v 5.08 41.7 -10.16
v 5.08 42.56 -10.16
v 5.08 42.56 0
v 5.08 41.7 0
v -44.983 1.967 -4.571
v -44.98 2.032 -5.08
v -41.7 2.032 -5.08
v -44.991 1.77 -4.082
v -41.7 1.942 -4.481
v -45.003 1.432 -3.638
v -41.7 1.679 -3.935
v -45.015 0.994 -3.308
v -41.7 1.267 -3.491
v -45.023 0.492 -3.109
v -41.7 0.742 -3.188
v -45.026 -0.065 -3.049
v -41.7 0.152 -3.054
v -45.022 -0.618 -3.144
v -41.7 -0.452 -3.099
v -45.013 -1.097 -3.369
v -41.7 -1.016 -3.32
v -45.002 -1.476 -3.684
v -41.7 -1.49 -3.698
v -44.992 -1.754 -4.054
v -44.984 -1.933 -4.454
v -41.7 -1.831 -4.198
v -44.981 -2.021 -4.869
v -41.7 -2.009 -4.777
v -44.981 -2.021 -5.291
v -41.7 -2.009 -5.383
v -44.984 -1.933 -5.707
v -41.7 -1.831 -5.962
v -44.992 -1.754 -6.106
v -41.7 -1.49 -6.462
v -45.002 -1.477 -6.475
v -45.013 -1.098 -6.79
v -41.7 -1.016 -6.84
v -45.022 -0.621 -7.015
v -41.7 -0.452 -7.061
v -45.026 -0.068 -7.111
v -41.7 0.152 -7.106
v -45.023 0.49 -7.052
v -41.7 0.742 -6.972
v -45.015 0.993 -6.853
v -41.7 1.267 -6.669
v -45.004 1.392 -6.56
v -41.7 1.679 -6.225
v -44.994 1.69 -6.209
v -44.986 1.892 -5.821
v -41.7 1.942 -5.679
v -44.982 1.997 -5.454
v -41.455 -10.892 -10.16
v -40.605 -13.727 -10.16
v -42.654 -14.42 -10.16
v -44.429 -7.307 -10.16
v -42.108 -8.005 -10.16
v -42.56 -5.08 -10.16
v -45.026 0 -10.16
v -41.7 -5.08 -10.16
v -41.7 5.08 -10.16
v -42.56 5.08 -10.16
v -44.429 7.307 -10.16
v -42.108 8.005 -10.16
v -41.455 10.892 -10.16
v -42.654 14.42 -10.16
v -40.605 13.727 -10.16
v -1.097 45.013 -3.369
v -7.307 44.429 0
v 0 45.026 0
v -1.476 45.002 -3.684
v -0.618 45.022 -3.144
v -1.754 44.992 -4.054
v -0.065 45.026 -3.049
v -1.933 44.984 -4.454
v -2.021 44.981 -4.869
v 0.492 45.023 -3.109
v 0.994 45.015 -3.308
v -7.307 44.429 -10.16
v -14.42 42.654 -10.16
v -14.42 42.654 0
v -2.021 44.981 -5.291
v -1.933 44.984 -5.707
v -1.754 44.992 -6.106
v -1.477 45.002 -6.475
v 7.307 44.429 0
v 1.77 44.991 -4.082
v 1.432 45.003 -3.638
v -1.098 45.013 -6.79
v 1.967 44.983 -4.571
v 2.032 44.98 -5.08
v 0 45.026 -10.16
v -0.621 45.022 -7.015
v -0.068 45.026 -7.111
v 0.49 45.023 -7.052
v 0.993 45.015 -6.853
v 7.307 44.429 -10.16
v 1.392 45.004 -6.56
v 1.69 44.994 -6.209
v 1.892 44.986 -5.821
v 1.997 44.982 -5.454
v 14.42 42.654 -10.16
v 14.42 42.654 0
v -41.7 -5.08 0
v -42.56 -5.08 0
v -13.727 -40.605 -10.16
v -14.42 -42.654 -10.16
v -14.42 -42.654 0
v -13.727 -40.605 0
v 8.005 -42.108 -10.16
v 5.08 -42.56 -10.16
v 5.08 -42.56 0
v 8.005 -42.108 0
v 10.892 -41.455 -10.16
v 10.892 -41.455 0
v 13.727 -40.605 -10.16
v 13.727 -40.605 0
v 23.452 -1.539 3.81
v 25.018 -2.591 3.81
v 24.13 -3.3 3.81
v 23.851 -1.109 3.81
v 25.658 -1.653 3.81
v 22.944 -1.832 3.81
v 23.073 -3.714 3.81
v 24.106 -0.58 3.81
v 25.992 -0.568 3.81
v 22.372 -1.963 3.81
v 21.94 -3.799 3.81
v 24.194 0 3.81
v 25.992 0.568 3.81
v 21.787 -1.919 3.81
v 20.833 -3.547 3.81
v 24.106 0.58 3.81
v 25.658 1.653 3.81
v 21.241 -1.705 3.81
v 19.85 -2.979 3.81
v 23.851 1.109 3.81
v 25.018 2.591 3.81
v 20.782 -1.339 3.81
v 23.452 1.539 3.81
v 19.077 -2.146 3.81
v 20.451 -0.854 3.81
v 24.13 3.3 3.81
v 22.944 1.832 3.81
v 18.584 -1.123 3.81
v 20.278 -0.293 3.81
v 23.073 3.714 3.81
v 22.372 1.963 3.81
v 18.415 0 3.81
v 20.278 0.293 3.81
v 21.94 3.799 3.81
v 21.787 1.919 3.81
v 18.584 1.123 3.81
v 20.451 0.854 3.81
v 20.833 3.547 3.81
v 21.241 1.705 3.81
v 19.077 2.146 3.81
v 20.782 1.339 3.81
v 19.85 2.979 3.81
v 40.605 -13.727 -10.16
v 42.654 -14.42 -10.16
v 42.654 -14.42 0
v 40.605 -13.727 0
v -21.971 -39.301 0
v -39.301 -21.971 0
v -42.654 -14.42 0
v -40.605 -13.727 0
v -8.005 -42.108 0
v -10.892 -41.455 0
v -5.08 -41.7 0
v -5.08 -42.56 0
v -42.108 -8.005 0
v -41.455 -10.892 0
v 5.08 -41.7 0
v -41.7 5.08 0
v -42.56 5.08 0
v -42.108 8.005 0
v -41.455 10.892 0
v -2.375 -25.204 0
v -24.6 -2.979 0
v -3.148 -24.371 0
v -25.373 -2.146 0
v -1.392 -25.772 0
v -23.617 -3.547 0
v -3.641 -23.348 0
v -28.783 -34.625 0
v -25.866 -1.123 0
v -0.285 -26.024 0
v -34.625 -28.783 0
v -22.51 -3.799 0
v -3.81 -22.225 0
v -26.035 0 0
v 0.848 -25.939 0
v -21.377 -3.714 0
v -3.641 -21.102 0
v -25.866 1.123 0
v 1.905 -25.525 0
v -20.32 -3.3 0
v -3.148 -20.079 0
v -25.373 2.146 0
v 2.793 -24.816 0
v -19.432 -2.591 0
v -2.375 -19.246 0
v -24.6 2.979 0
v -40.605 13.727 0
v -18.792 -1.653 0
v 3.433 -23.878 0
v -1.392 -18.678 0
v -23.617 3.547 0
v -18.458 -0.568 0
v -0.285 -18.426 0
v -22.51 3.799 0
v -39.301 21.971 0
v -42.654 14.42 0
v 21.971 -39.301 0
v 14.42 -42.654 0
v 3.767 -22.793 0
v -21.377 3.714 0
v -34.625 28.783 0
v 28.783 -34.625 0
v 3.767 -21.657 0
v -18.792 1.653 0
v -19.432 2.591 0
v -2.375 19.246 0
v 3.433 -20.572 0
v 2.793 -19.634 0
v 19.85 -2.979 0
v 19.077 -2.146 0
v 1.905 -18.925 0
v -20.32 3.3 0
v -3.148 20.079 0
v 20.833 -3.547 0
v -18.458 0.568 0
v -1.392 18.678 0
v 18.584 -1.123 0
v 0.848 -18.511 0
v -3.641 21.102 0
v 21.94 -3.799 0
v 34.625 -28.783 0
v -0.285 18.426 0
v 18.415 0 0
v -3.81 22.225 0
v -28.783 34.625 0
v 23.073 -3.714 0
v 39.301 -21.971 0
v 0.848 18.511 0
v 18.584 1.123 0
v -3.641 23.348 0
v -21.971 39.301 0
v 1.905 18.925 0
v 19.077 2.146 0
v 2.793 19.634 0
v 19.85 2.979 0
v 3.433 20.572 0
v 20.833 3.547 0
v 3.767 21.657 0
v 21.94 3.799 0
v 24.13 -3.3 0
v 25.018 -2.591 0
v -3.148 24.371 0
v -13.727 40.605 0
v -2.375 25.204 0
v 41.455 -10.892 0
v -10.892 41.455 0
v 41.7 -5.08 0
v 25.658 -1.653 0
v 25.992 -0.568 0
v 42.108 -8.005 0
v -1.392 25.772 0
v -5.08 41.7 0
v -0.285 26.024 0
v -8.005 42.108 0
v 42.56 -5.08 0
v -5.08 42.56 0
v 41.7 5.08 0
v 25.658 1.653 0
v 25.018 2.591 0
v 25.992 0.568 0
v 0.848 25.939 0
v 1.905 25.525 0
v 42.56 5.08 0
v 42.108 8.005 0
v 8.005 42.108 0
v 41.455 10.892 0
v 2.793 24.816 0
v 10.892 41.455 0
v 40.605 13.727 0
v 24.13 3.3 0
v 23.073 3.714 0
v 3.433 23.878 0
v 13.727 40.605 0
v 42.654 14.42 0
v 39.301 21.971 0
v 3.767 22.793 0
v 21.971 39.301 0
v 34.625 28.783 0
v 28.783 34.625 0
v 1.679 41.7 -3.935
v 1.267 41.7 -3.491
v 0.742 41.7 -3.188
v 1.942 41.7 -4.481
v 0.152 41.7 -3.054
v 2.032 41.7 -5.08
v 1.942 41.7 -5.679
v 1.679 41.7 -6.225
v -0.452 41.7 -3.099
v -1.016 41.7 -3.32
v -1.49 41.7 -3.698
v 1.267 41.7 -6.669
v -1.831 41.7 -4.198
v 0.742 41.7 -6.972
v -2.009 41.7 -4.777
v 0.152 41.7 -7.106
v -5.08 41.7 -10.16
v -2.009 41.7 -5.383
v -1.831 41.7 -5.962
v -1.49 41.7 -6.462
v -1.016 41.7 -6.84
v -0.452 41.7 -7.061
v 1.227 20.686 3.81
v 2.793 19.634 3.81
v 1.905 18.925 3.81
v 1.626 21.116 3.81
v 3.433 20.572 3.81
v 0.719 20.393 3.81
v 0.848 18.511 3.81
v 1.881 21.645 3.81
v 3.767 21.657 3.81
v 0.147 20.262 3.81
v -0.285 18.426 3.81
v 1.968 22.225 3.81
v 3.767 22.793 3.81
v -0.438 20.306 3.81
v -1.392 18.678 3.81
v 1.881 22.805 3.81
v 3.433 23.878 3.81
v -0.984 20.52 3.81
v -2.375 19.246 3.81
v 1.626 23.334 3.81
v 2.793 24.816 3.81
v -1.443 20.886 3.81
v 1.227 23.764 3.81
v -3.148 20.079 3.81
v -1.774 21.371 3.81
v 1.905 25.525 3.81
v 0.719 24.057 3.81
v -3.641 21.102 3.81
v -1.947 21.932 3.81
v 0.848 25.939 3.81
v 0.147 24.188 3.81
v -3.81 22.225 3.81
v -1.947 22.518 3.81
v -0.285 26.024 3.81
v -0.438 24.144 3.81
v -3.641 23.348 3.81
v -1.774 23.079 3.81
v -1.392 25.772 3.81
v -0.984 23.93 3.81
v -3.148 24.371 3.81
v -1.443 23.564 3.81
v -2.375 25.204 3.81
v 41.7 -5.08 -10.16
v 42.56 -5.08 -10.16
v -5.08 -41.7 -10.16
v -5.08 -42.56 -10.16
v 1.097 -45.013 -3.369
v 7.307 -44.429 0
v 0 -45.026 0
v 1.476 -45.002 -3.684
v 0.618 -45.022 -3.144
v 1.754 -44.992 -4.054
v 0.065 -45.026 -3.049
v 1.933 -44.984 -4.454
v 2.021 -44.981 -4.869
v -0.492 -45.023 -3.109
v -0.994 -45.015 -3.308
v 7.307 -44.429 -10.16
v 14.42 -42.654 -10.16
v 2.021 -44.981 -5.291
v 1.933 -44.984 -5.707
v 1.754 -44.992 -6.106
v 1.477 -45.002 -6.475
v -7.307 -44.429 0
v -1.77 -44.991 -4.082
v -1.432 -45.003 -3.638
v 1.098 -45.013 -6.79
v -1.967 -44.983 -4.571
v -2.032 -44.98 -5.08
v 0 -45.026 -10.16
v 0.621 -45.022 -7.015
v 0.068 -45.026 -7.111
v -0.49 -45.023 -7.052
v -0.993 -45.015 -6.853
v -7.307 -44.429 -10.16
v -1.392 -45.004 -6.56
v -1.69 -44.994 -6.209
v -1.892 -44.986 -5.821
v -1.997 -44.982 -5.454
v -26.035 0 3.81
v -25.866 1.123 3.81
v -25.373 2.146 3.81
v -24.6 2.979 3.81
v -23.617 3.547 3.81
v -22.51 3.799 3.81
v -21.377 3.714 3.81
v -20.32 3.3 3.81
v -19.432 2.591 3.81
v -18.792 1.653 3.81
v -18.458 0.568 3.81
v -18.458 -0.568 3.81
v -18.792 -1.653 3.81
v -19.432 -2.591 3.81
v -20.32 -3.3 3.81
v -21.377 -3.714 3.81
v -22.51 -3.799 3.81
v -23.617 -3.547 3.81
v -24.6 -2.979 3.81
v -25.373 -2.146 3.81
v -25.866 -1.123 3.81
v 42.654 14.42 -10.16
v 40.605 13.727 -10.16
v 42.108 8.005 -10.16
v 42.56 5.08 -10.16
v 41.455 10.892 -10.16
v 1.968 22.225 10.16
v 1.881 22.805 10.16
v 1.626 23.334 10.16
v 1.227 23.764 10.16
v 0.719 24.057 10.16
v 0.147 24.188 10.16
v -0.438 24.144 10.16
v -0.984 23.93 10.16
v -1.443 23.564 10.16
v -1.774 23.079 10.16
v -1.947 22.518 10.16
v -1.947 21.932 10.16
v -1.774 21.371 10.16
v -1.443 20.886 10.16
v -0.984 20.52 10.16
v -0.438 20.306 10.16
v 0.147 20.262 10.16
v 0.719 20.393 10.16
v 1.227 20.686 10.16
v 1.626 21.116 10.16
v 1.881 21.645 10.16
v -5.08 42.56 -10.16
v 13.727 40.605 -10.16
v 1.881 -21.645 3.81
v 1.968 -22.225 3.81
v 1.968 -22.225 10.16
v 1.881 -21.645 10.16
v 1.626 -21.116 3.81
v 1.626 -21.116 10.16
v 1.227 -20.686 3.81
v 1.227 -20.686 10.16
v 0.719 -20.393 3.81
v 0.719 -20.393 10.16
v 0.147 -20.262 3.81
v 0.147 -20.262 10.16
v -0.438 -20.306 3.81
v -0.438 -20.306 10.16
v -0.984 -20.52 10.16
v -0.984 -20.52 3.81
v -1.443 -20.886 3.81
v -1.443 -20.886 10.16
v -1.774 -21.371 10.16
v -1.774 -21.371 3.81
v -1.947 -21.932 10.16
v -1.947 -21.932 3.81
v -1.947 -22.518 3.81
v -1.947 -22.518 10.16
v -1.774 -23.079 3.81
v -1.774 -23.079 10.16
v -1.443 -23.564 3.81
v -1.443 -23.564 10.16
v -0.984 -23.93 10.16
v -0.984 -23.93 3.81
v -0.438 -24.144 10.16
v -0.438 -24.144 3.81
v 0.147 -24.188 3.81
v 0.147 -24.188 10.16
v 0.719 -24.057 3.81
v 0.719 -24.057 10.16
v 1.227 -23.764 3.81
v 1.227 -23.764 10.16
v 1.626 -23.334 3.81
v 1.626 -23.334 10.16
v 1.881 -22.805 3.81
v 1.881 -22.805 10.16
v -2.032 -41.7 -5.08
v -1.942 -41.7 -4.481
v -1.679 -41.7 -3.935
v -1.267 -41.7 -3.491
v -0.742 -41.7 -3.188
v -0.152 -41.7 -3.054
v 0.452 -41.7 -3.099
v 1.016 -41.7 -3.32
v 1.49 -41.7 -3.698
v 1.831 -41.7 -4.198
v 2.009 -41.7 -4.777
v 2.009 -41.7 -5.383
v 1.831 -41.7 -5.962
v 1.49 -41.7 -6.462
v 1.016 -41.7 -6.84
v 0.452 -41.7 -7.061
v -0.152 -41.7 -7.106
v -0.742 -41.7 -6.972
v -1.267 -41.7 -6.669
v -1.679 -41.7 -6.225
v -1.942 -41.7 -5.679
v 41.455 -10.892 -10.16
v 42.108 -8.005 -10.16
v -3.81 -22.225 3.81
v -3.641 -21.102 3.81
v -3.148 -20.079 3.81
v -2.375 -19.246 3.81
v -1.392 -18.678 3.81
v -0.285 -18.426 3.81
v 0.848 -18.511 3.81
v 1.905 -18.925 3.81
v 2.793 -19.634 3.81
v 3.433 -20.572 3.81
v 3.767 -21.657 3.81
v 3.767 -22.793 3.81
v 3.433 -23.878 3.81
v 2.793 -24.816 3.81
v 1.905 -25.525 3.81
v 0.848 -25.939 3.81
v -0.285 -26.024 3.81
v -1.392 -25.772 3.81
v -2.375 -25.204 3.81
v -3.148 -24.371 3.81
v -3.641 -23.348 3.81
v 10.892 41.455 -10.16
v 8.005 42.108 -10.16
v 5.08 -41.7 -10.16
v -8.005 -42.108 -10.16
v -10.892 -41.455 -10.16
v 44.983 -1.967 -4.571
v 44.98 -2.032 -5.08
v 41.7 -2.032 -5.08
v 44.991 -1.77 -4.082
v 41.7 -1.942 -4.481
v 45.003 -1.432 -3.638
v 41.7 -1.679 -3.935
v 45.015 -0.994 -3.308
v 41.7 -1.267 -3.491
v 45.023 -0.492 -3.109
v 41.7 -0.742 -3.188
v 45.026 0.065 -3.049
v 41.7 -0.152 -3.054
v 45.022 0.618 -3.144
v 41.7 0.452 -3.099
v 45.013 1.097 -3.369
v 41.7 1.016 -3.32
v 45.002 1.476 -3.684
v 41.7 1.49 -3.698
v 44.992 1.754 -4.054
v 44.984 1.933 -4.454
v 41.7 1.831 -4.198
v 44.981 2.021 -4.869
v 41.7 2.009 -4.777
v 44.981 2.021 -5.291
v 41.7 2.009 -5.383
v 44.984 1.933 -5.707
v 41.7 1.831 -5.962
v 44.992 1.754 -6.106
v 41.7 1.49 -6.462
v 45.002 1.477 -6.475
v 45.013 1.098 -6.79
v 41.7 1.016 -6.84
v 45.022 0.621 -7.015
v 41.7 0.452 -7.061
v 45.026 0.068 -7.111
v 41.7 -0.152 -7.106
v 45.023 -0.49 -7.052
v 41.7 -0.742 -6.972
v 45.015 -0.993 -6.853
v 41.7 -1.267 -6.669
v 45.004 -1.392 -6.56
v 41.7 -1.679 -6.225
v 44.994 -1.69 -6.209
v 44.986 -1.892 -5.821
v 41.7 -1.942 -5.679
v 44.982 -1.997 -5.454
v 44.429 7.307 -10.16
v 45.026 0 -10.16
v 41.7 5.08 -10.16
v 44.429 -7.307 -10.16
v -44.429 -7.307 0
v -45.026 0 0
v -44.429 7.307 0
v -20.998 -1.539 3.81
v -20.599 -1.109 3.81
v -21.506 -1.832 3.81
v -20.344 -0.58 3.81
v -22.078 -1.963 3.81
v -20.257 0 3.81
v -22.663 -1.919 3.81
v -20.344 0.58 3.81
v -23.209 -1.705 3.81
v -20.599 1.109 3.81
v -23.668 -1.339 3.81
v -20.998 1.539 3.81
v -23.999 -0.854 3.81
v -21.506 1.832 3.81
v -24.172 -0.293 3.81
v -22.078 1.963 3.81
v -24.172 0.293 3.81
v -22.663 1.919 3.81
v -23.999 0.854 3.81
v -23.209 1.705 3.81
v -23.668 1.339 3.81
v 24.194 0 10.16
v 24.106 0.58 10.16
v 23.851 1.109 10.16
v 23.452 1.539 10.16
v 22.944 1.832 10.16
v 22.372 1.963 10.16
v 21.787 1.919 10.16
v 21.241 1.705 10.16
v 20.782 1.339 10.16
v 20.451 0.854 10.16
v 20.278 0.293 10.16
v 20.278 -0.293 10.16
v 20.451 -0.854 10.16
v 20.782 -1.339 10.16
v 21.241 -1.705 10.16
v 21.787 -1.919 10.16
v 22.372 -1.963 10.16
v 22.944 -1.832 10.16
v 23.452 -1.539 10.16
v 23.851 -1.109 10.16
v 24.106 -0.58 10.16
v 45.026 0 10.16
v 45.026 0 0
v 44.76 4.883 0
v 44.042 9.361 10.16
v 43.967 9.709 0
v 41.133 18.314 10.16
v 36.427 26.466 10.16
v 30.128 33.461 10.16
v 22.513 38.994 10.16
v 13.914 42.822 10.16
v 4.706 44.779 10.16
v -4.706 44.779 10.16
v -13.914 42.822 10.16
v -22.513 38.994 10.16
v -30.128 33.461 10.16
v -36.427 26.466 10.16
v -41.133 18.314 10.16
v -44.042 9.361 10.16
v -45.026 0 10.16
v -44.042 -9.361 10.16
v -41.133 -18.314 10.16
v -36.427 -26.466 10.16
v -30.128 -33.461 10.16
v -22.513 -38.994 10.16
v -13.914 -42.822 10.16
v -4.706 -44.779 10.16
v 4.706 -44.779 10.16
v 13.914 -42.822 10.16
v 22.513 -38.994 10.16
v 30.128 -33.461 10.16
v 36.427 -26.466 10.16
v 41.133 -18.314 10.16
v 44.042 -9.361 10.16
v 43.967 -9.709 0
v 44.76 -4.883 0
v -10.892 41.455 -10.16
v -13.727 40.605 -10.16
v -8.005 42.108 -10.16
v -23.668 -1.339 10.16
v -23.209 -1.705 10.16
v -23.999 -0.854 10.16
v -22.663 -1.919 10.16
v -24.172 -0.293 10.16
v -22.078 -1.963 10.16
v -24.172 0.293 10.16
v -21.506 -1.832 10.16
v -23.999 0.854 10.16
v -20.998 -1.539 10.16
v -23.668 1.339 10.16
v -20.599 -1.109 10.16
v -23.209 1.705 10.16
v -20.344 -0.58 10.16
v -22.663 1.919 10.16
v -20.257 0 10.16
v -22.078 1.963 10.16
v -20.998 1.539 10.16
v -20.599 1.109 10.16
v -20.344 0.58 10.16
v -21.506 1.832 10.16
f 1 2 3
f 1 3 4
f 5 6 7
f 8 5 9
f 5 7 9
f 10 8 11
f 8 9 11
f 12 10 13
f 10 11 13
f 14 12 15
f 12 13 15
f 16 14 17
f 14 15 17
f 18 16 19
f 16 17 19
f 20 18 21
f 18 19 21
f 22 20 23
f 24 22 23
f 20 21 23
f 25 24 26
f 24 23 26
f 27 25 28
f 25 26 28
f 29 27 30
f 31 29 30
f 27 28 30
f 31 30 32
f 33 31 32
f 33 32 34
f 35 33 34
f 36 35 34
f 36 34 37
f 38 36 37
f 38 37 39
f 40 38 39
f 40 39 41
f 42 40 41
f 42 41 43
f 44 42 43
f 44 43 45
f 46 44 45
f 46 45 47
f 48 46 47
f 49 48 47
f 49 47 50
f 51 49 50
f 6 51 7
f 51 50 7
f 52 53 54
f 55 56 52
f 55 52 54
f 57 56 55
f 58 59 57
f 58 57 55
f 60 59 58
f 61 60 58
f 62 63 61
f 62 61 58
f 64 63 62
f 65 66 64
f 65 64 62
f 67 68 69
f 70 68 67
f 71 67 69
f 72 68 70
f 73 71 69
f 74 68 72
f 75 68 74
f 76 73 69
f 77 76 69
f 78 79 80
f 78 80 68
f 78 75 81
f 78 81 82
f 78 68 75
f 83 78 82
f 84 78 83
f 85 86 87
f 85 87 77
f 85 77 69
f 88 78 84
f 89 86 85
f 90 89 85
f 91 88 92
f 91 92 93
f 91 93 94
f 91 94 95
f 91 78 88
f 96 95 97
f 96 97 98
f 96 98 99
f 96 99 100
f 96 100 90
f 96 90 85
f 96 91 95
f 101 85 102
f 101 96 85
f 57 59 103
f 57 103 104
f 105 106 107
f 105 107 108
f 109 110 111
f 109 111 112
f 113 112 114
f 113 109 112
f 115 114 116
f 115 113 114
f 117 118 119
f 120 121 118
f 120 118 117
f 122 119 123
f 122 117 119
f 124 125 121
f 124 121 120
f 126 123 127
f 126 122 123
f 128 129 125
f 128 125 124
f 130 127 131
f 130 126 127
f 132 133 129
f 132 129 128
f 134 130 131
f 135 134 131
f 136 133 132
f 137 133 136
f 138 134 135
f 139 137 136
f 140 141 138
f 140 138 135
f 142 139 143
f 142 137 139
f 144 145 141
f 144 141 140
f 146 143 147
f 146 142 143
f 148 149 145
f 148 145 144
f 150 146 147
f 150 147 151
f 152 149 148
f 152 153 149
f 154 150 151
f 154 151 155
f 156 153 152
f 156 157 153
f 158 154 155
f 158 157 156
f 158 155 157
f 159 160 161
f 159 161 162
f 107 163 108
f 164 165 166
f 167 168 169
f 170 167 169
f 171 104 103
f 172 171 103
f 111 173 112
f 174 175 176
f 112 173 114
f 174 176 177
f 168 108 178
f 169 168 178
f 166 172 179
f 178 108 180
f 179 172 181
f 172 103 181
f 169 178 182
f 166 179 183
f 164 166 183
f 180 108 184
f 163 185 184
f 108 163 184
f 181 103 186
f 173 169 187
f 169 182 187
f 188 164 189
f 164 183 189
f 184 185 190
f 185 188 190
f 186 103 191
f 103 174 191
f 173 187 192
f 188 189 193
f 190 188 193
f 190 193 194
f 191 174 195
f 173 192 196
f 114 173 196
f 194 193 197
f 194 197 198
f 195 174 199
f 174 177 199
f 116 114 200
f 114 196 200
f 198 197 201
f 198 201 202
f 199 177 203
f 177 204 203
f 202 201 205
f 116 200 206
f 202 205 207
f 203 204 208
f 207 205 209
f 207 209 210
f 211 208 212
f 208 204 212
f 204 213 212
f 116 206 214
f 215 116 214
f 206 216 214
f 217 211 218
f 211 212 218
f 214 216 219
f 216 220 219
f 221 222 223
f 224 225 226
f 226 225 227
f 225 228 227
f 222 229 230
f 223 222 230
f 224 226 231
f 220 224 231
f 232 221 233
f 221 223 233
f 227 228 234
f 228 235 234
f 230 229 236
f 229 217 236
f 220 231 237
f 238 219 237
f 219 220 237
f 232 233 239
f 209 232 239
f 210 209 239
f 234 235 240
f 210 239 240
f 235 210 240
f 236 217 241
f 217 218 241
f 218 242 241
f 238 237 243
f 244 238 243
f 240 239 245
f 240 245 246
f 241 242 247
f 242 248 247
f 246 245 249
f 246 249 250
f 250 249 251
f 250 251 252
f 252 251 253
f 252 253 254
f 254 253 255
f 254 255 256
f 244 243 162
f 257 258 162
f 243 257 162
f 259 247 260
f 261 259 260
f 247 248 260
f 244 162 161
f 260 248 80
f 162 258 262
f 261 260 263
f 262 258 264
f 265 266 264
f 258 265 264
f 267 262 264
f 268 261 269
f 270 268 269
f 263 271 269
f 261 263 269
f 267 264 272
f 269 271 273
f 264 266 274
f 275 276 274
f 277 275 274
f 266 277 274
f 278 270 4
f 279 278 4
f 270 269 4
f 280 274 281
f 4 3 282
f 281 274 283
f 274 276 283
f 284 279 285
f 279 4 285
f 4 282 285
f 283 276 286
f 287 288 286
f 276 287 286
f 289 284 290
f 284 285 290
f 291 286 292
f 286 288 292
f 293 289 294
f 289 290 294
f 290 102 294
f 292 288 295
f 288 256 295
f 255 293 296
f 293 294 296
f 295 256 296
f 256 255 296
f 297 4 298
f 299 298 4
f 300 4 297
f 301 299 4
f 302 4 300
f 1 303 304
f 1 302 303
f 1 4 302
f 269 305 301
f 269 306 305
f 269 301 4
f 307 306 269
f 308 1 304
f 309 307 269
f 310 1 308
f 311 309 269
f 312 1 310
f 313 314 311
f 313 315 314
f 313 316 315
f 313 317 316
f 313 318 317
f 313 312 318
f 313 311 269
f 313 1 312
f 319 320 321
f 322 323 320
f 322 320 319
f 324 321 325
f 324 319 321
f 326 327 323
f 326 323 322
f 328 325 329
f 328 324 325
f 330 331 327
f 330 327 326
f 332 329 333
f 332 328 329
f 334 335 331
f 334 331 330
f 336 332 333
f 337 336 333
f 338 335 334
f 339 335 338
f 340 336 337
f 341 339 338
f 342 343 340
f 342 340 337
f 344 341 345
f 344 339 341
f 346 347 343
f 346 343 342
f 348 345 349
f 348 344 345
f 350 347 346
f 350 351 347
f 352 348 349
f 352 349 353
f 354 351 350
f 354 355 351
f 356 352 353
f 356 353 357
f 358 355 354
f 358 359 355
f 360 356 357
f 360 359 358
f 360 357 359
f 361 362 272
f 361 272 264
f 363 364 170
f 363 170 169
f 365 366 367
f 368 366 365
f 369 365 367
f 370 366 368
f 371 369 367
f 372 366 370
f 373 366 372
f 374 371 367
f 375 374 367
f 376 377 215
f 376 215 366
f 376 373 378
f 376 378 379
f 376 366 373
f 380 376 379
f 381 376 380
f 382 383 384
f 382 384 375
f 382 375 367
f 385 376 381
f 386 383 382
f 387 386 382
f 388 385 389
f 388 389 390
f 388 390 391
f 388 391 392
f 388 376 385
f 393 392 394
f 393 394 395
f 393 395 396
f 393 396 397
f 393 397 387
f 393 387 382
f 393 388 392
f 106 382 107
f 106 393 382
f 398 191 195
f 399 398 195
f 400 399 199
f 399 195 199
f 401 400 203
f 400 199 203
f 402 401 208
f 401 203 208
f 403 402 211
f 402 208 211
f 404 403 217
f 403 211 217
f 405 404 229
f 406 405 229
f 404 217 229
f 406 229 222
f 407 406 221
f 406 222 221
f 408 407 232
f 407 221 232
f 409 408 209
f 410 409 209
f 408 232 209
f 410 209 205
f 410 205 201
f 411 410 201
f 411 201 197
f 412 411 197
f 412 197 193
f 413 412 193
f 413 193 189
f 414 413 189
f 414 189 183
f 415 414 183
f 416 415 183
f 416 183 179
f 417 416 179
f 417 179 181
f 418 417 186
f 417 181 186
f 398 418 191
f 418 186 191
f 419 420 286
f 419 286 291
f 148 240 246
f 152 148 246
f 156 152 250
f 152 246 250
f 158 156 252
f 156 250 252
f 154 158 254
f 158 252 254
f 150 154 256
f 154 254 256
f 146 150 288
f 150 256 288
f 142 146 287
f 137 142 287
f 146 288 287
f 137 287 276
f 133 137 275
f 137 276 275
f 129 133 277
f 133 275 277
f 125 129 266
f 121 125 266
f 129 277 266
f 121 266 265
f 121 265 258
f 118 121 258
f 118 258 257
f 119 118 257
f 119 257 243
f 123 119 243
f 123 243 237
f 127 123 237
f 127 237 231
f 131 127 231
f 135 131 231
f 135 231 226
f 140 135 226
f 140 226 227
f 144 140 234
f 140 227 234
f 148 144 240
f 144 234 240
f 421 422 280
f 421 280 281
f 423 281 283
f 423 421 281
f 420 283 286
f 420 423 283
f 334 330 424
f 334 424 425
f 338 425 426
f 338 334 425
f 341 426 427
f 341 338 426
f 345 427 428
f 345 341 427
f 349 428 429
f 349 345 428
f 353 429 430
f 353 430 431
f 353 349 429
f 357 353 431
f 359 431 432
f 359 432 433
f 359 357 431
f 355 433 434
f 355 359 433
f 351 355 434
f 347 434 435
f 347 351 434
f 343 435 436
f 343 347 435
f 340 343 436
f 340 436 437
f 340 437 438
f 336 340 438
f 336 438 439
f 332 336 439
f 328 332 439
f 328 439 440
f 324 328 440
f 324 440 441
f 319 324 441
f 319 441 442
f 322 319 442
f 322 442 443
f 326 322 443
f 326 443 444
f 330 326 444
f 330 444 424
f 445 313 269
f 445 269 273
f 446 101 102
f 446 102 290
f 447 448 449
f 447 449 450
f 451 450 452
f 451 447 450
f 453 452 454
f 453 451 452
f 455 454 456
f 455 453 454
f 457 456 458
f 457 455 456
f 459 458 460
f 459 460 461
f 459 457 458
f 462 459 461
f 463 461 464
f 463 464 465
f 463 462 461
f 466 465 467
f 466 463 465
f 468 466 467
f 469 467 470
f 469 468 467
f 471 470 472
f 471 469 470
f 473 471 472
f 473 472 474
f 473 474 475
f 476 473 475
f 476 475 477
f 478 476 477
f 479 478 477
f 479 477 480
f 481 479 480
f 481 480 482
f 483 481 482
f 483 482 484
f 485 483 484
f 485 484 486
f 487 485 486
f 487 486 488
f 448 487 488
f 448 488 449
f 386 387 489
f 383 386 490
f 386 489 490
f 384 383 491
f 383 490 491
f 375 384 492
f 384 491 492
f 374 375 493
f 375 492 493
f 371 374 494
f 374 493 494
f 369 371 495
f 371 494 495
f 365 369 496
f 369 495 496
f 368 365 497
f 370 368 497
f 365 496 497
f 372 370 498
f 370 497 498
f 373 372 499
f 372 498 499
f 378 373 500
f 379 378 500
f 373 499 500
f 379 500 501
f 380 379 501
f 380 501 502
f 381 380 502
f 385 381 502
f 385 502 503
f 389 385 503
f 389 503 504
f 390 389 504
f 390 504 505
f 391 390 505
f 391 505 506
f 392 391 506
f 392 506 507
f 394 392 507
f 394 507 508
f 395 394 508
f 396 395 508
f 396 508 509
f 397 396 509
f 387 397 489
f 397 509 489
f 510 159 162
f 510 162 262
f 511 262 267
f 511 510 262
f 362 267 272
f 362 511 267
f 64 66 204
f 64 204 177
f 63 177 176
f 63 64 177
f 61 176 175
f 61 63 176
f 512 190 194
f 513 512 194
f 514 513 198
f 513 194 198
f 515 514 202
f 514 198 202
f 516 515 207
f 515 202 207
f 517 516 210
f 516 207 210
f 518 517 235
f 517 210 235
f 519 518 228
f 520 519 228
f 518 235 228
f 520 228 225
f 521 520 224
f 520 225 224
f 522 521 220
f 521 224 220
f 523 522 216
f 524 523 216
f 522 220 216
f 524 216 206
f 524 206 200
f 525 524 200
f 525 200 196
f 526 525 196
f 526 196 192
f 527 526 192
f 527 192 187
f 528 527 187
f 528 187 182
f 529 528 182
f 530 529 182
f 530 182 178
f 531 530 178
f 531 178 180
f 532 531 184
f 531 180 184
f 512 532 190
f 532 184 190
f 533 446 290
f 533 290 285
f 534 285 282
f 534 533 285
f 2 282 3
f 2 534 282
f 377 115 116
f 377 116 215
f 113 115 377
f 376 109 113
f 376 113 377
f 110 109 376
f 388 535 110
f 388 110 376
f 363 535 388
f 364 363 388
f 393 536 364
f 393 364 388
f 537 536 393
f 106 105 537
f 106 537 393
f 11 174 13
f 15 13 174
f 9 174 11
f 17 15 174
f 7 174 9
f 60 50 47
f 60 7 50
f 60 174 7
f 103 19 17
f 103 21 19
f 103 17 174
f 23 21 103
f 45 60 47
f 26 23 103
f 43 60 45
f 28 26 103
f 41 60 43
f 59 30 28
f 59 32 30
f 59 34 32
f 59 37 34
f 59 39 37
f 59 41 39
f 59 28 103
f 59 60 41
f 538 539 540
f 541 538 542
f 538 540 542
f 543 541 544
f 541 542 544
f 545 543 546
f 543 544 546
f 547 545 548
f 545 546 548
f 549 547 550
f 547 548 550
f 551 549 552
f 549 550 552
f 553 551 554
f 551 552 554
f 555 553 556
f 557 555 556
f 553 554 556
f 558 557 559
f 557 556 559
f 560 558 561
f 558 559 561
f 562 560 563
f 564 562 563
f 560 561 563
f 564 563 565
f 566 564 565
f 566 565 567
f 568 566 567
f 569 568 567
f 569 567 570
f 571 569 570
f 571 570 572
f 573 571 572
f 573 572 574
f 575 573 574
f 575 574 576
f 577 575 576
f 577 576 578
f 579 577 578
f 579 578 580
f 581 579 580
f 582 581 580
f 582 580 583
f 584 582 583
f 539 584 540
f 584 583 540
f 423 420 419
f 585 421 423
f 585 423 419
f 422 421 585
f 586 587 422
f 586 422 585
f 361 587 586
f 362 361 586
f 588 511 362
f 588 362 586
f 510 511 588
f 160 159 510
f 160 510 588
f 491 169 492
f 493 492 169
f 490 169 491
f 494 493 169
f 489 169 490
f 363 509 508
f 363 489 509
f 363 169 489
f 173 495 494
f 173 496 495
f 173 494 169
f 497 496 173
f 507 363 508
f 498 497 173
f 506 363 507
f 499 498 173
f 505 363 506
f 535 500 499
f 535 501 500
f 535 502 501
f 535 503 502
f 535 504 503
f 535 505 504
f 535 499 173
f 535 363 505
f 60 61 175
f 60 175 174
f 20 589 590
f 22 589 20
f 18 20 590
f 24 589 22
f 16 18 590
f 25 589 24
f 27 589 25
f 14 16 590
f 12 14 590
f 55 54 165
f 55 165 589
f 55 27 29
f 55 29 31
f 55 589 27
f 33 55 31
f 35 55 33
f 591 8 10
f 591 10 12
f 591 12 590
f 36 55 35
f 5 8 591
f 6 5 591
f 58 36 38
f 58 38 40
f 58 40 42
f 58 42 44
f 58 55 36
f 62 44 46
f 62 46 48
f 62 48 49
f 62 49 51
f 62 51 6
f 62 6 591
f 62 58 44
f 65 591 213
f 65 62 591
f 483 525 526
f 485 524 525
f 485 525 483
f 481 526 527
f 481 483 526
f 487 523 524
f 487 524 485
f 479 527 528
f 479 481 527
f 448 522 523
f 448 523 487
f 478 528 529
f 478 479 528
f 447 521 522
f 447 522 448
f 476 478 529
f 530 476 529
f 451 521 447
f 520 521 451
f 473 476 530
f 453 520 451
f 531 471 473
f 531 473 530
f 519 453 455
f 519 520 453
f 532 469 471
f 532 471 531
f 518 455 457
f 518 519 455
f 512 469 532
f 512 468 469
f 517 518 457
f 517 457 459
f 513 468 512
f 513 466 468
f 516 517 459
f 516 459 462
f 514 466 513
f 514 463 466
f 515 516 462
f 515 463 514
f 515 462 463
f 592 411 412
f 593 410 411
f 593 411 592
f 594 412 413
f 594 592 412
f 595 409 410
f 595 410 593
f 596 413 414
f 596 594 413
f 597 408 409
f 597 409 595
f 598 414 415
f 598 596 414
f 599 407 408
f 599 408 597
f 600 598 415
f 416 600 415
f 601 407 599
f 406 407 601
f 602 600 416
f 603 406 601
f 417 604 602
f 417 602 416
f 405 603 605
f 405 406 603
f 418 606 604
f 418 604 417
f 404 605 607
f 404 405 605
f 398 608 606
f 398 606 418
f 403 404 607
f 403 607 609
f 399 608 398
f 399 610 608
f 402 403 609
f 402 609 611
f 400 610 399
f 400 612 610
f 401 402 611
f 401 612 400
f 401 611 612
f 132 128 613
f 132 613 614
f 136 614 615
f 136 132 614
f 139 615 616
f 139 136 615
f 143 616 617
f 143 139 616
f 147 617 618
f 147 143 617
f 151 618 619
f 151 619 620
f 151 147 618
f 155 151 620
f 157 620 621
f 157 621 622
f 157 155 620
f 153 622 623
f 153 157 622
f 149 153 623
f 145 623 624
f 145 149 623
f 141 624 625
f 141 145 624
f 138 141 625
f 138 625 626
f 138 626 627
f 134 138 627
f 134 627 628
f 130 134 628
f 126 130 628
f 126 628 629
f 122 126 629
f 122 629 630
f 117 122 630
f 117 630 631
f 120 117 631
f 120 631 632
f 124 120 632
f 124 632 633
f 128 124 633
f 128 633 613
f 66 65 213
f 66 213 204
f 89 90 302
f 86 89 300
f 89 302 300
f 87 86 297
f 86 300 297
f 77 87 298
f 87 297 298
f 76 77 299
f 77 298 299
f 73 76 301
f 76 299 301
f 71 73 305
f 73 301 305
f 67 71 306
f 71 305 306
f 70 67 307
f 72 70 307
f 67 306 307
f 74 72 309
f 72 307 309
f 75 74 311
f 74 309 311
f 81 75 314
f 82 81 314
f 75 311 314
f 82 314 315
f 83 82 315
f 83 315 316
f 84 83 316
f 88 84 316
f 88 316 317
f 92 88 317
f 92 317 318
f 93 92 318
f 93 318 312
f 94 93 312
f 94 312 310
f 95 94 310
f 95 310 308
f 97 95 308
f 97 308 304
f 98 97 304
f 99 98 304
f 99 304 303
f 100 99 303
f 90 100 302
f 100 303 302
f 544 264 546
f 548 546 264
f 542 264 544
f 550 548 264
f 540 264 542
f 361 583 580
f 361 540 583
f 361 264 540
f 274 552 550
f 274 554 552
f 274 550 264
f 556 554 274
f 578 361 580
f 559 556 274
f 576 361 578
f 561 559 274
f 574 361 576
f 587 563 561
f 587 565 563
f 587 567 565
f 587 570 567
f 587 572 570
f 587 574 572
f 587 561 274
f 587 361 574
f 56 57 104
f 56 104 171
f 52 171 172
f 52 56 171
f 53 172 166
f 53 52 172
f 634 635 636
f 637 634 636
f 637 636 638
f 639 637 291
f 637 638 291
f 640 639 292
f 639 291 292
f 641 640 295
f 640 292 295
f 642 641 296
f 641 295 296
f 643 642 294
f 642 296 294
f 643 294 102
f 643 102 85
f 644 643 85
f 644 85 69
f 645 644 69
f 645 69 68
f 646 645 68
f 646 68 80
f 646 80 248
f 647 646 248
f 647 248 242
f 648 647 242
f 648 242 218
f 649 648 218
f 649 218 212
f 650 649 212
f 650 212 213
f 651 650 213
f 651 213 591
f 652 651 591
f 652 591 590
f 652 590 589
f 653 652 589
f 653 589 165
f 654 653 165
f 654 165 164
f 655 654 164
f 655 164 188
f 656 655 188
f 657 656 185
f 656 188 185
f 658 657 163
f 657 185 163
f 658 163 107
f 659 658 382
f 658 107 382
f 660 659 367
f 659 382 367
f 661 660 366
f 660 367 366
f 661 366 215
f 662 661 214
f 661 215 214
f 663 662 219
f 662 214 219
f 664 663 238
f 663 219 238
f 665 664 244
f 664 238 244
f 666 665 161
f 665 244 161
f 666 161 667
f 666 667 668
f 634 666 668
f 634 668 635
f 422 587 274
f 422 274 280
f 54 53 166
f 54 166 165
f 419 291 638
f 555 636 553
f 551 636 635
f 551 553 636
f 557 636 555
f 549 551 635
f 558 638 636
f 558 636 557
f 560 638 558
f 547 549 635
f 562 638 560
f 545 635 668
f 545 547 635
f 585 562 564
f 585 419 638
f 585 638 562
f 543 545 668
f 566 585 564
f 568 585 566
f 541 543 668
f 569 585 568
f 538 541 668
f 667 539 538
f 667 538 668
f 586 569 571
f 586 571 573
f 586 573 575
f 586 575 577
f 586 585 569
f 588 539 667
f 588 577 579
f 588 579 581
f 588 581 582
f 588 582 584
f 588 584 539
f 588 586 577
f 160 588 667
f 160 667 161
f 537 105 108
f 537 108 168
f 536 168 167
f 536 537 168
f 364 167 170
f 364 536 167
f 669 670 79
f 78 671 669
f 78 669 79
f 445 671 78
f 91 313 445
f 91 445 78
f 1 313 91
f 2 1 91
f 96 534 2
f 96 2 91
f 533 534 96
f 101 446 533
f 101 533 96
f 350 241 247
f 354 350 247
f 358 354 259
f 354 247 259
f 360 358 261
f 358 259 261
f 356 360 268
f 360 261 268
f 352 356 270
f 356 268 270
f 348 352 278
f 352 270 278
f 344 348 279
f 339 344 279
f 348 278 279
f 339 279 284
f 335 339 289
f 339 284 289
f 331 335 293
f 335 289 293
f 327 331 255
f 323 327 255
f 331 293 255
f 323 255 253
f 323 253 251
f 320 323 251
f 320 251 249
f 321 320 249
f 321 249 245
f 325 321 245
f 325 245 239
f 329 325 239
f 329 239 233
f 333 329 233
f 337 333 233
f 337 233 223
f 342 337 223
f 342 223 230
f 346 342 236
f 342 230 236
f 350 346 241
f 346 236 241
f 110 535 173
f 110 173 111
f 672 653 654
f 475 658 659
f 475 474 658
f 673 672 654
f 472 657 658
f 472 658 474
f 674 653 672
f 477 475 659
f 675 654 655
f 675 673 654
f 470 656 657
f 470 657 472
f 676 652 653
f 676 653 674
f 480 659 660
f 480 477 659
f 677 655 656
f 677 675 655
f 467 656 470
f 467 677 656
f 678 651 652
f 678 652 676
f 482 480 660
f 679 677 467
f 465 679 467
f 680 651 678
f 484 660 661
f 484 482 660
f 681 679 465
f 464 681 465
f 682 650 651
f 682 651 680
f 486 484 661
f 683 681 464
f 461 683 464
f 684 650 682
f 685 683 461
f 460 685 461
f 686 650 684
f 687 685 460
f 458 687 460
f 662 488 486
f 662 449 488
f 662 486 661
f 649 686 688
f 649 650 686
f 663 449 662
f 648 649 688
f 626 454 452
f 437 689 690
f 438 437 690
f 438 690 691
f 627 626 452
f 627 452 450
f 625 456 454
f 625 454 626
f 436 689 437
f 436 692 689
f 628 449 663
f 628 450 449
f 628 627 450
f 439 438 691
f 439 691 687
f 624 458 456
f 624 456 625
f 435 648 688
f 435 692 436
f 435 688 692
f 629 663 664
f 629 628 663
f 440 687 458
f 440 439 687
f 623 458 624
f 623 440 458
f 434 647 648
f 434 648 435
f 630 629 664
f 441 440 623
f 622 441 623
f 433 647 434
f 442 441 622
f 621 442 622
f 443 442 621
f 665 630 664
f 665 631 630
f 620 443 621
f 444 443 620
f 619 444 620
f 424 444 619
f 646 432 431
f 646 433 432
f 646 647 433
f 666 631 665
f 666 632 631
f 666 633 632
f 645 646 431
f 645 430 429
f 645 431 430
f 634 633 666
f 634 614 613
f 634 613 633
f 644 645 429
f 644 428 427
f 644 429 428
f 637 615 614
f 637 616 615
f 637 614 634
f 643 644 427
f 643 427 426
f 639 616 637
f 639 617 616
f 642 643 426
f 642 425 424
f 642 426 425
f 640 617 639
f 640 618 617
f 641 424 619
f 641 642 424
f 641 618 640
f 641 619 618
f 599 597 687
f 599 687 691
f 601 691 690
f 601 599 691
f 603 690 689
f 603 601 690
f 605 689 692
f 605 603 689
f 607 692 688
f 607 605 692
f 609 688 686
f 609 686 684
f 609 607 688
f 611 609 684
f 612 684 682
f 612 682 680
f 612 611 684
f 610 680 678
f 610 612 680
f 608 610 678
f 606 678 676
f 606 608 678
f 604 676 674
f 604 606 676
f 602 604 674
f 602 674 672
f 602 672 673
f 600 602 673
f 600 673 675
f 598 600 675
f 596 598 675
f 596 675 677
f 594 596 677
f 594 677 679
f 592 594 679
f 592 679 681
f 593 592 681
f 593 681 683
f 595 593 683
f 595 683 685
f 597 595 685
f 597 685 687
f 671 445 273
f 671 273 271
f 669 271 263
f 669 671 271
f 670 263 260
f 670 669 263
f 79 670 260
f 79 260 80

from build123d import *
from build123d.topology import SkipClean

# Parameters (mm, degrees)
SKETCH2_R           = 45.025932087
SKETCH2_R_2         = 1.9685
BOSS_EXTRUDE1_DEPTH = 10.16
SKETCH3_R           = 3.81
CUT_EXTRUDE1_DEPTH  = 3.81
BOSS_EXTRUDE2_START = 10.16
BOSS_EXTRUDE2_DEPTH = 10.16
SKETCH6_R           = 2.032
CUT_EXTRUDE2_DEPTH  = 10.16
CIRPATTERN2_COUNT   = 4


with BuildPart() as part:
    # Sketch2 → Boss-Extrude1 (new body)
    with BuildSketch(Plane.XY):
        Circle(SKETCH2_R)
        with Locations((0, -22.225)):
            Circle(SKETCH2_R_2, mode=Mode.SUBTRACT)
        with Locations((-22.225, 0)):
            Circle(SKETCH2_R_2, mode=Mode.SUBTRACT)
        with Locations((0, 22.225)):
            Circle(SKETCH2_R_2, mode=Mode.SUBTRACT)
        with Locations((22.225, 0)):
            Circle(SKETCH2_R_2, mode=Mode.SUBTRACT)
    extrude(amount=BOSS_EXTRUDE1_DEPTH)

    # Sketch3 → Cut-Extrude1 (cut)
    with BuildSketch(Plane(origin=(0, 0, 0), x_dir=(-1, 0, 0), z_dir=(0, 0, -1))):
        with Locations((0, 22.225)):
            Circle(SKETCH3_R)
        with Locations((22.225, 0)):
            Circle(SKETCH3_R)
        with Locations((0, -22.225)):
            Circle(SKETCH3_R)
        with Locations((-22.225, 0)):
            Circle(SKETCH3_R)
    extrude(amount=-CUT_EXTRUDE1_DEPTH, mode=Mode.SUBTRACT)

    # Sketch5 → Boss-Extrude2 (add)
    with SkipClean():  # the faces are left unmerged after this step: merging them gives an invalid solid
        with BuildSketch(Plane(origin=(0, 0, 0), x_dir=(-1, 0, 0), z_dir=(0, 0, -1)).offset(BOSS_EXTRUDE2_START)):
            with BuildLine():
                Line((41.699931294, 5.08), (41.699931294, -5.08))
                Line((41.699931294, -5.08), (42.560096203, -5.08))
                ThreePointArc((42.560096203, -5.08), (41.806519891, -9.454262714), (40.604604544, -13.727136578))
                Line((40.604604544, -13.727136578), (42.654370672, -14.420097879))
                ThreePointArc((42.654370672, -14.420097879), (45.025932087, 0), (42.654370672, 14.420097879))
                Line((42.654370672, 14.420097879), (40.604604544, 13.727136578))
                ThreePointArc((40.604604544, 13.727136578), (41.806519891, 9.454262714), (42.560096203, 5.08))
                Line((42.560096203, 5.08), (41.699931294, 5.08))
            make_face()
        boss_extrude2 = extrude(amount=-BOSS_EXTRUDE2_DEPTH)

    # Sketch6 → Cut-Extrude2 (cut)
    with SkipClean():  # the faces are left unmerged after this step: merging them gives an invalid solid
        with BuildSketch(Plane(origin=(-41.699931294, 0, 0), x_dir=(0, 0, -1), z_dir=(1, 0, 0))):
            with Locations(Location((5.08, 0, 0), (0, 0, 90))):
                Circle(SKETCH6_R)
        cut_extrude2 = extrude(amount=-CUT_EXTRUDE2_DEPTH, mode=Mode.SUBTRACT)

    # CirPattern2: Boss-Extrude2, Cut-Extrude2 ×4 about axis
    with SkipClean():  # the faces are left unmerged after this step: merging them gives an invalid solid
        cirpattern2_axis = Axis((0, 0, 0), (0, 0, 1))
        add([boss_extrude2.rotate(cirpattern2_axis, i * 360 / CIRPATTERN2_COUNT) for i in range(1, CIRPATTERN2_COUNT)])
        add([cut_extrude2.rotate(cirpattern2_axis, i * 360 / CIRPATTERN2_COUNT) for i in range(1, CIRPATTERN2_COUNT)], mode=Mode.SUBTRACT)


solid = part.part
